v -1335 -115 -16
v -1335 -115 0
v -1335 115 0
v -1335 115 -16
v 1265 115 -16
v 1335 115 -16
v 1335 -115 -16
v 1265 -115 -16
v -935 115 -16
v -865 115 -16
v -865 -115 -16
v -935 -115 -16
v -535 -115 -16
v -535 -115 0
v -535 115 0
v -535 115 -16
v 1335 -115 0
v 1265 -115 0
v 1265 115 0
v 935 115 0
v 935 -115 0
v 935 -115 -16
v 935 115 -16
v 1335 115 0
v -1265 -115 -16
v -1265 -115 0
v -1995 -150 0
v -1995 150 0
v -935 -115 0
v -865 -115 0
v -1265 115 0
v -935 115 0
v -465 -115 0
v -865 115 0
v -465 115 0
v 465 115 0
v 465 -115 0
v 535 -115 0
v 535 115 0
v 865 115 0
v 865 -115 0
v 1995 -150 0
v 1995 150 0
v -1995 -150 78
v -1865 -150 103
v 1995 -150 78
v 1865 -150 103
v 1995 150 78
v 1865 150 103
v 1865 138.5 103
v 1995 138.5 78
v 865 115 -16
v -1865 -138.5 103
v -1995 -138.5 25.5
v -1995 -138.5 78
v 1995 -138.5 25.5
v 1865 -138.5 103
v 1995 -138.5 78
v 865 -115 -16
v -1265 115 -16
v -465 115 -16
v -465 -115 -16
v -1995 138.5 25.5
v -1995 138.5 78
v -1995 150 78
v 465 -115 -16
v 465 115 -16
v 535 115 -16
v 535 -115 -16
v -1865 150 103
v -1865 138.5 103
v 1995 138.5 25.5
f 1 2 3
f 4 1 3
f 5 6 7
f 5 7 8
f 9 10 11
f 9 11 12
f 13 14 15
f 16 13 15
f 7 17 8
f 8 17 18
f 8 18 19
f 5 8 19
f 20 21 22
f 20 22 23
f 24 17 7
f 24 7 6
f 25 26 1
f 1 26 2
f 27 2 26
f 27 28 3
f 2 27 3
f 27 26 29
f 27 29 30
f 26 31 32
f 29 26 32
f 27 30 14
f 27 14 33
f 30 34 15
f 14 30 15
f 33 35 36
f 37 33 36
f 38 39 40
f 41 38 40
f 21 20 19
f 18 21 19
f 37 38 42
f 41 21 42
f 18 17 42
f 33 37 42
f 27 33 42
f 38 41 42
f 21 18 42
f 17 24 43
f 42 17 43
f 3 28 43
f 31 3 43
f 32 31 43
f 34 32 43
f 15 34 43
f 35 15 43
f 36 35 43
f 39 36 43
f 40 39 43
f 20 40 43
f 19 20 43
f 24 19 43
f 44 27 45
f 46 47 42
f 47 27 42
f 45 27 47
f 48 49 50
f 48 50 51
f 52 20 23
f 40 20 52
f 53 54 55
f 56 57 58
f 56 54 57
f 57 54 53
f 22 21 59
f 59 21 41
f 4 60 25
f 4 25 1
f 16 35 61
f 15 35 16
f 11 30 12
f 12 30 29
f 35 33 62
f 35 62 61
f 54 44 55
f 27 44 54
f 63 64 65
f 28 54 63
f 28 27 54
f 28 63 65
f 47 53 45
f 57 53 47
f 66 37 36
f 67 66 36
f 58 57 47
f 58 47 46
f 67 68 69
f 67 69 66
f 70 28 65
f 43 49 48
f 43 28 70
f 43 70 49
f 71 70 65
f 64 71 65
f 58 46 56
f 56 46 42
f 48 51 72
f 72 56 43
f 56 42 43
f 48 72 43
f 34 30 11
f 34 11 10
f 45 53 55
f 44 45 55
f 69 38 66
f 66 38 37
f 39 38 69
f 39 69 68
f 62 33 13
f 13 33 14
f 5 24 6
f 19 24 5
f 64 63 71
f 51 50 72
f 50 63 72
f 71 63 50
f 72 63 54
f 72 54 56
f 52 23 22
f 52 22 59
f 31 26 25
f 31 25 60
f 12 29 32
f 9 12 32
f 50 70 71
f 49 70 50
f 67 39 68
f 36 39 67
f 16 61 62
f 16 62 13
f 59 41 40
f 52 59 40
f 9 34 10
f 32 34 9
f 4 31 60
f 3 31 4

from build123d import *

# Parameters (mm, degrees)
SKETCH_1_W          = 3990
SKETCH_1_H          = 300
SKETCH_1_R          = 13
SKETCH_1_R_2        = 11.5
EXTRUDE_1608_DEPTH  = 25.5
SKETCH_2_W          = 3990
SKETCH_2_H          = 11.5
EXTRUDE_1_DEPTH     = 77.5
SKETCH_3_W          = 70
SKETCH_3_H          = 230
EXTRUDE_2_DEPTH     = 16
SKETCH_4_R          = 13
CUT_EXTRUDE_1_DEPTH = 2003.131676489
CUT_EXTRUDE_2_DEPTH = 2021.057919962
SKETCH_6_W          = 3990
SKETCH_6_H          = 277
EXTRUDE_3_DEPTH     = 25.5
SKETCH_7_W          = 70
SKETCH_7_H          = 230
EXTRUDE_4_DEPTH     = 16


with BuildPart() as part:
    # 草图1 → Extrude 1608 (new body)
    with BuildSketch(Plane.XY):
        Rectangle(SKETCH_1_W, SKETCH_1_H)
        with Locations((1940, 80)):
            Circle(SKETCH_1_R, mode=Mode.SUBTRACT)
        with Locations((1860, 80)):
            Circle(SKETCH_1_R, mode=Mode.SUBTRACT)
        with Locations((1780, 80)):
            Circle(SKETCH_1_R, mode=Mode.SUBTRACT)
        with Locations((1700, 80)):
            Circle(SKETCH_1_R, mode=Mode.SUBTRACT)
        with Locations((1540, 80)):
            Circle(SKETCH_1_R_2, mode=Mode.SUBTRACT)
        with Locations((1380, 80)):
            Circle(SKETCH_1_R_2, mode=Mode.SUBTRACT)
        with Locations((1220, 80)):
            Circle(SKETCH_1_R_2, mode=Mode.SUBTRACT)
        with Locations((1060, 80)):
            Circle(SKETCH_1_R_2, mode=Mode.SUBTRACT)
        with Locations((980, 80)):
            Circle(SKETCH_1_R_2, mode=Mode.SUBTRACT)
        with Locations((820, 80)):
            Circle(SKETCH_1_R_2, mode=Mode.SUBTRACT)
        with Locations((740, 80)):
            Circle(SKETCH_1_R_2, mode=Mode.SUBTRACT)
        with Locations((580, 80)):
            Circle(SKETCH_1_R_2, mode=Mode.SUBTRACT)
        with Locations((980, 0)):
            Circle(SKETCH_1_R_2, mode=Mode.SUBTRACT)
        with Locations((1060, 0)):
            Circle(SKETCH_1_R_2, mode=Mode.SUBTRACT)
        with Locations((820, 0)):
            Circle(SKETCH_1_R_2, mode=Mode.SUBTRACT)
        with Locations((740, 0)):
            Circle(SKETCH_1_R_2, mode=Mode.SUBTRACT)
        with Locations((580, 0)):
            Circle(SKETCH_1_R_2, mode=Mode.SUBTRACT)
        with Locations((1220, 0)):
            Circle(SKETCH_1_R_2, mode=Mode.SUBTRACT)
        with Locations((1380, 0)):
            Circle(SKETCH_1_R_2, mode=Mode.SUBTRACT)
        with Locations((1540, 0)):
            Circle(SKETCH_1_R_2, mode=Mode.SUBTRACT)
        with Locations((1700, 0)):
            Circle(SKETCH_1_R, mode=Mode.SUBTRACT)
        with Locations((1780, 0)):
            Circle(SKETCH_1_R, mode=Mode.SUBTRACT)
        with Locations((1860, 0)):
            Circle(SKETCH_1_R, mode=Mode.SUBTRACT)
        with Locations((1940, 0)):
            Circle(SKETCH_1_R, mode=Mode.SUBTRACT)
        with Locations((420, 80)):
            Circle(SKETCH_1_R_2, mode=Mode.SUBTRACT)
        with Locations((420, 0)):
            Circle(SKETCH_1_R_2, mode=Mode.SUBTRACT)
        with Locations((300, 0)):
            Circle(SKETCH_1_R_2, mode=Mode.SUBTRACT)
        with Locations((300, 80)):
            Circle(SKETCH_1_R_2, mode=Mode.SUBTRACT)
        with Locations((220, 80)):
            Circle(SKETCH_1_R_2, mode=Mode.SUBTRACT)
        with Locations((220, 0)):
            Circle(SKETCH_1_R_2, mode=Mode.SUBTRACT)
        with Locations((140, 0)):
            Circle(SKETCH_1_R, mode=Mode.SUBTRACT)
        with Locations((140, 80)):
            Circle(SKETCH_1_R, mode=Mode.SUBTRACT)
        with Locations((60, 80)):
            Circle(SKETCH_1_R, mode=Mode.SUBTRACT)
        with Locations((60, 0)):
            Circle(SKETCH_1_R, mode=Mode.SUBTRACT)
        with Locations(Location((1700, -80, 0), (0, 0, 180))):
            Circle(SKETCH_1_R, mode=Mode.SUBTRACT)
        with Locations(Location((1780, -80, 0), (0, 0, 180))):
            Circle(SKETCH_1_R, mode=Mode.SUBTRACT)
        with Locations(Location((1860, -80, 0), (0, 0, 180))):
            Circle(SKETCH_1_R, mode=Mode.SUBTRACT)
        with Locations(Location((1940, -80, 0), (0, 0, 180))):
            Circle(SKETCH_1_R, mode=Mode.SUBTRACT)
        with Locations(Location((580, -80, 0), (0, 0, 180))):
            Circle(SKETCH_1_R_2, mode=Mode.SUBTRACT)
        with Locations(Location((740, -80, 0), (0, 0, 180))):
            Circle(SKETCH_1_R_2, mode=Mode.SUBTRACT)
        with Locations(Location((820, -80, 0), (0, 0, 180))):
            Circle(SKETCH_1_R_2, mode=Mode.SUBTRACT)
        with Locations(Location((980, -80, 0), (0, 0, 180))):
            Circle(SKETCH_1_R_2, mode=Mode.SUBTRACT)
        with Locations(Location((1060, -80, 0), (0, 0, 180))):
            Circle(SKETCH_1_R_2, mode=Mode.SUBTRACT)
        with Locations(Location((1220, -80, 0), (0, 0, 180))):
            Circle(SKETCH_1_R_2, mode=Mode.SUBTRACT)
        with Locations(Location((1380, -80, 0), (0, 0, 180))):
            Circle(SKETCH_1_R_2, mode=Mode.SUBTRACT)
        with Locations(Location((1540, -80, 0), (0, 0, 180))):
            Circle(SKETCH_1_R_2, mode=Mode.SUBTRACT)
        with Locations(Location((220, -80, 0), (0, 0, 180))):
            Circle(SKETCH_1_R_2, mode=Mode.SUBTRACT)
        with Locations(Location((300, -80, 0), (0, 0, 180))):
            Circle(SKETCH_1_R_2, mode=Mode.SUBTRACT)
        with Locations(Location((420, -80, 0), (0, 0, 180))):
            Circle(SKETCH_1_R_2, mode=Mode.SUBTRACT)
        with Locations(Location((60, -80, 0), (0, 0, 180))):
            Circle(SKETCH_1_R, mode=Mode.SUBTRACT)
        with Locations(Location((140, -80, 0), (0, 0, 180))):
            Circle(SKETCH_1_R, mode=Mode.SUBTRACT)
        with Locations((-140, -80)):
            Circle(SKETCH_1_R, mode=Mode.SUBTRACT)
        with Locations((-60, -80)):
            Circle(SKETCH_1_R, mode=Mode.SUBTRACT)
        with Locations((-580, -80)):
            Circle(SKETCH_1_R_2, mode=Mode.SUBTRACT)
        with Locations((-420, -80)):
            Circle(SKETCH_1_R_2, mode=Mode.SUBTRACT)
        with Locations((-300, -80)):
            Circle(SKETCH_1_R_2, mode=Mode.SUBTRACT)
        with Locations((-220, -80)):
            Circle(SKETCH_1_R_2, mode=Mode.SUBTRACT)
        with Locations((-1540, -80)):
            Circle(SKETCH_1_R_2, mode=Mode.SUBTRACT)
        with Locations((-1380, -80)):
            Circle(SKETCH_1_R_2, mode=Mode.SUBTRACT)
        with Locations((-1220, -80)):
            Circle(SKETCH_1_R_2, mode=Mode.SUBTRACT)
        with Locations((-1060, -80)):
            Circle(SKETCH_1_R_2, mode=Mode.SUBTRACT)
        with Locations((-980, -80)):
            Circle(SKETCH_1_R_2, mode=Mode.SUBTRACT)
        with Locations((-820, -80)):
            Circle(SKETCH_1_R_2, mode=Mode.SUBTRACT)
        with Locations((-740, -80)):
            Circle(SKETCH_1_R_2, mode=Mode.SUBTRACT)
        with Locations((-1940, -80)):
            Circle(SKETCH_1_R, mode=Mode.SUBTRACT)
        with Locations((-1860, -80)):
            Circle(SKETCH_1_R, mode=Mode.SUBTRACT)
        with Locations((-1780, -80)):
            Circle(SKETCH_1_R, mode=Mode.SUBTRACT)
        with Locations((-1700, -80)):
            Circle(SKETCH_1_R, mode=Mode.SUBTRACT)
        with Locations(Location((-60, 0, 0), (0, 0, 180))):
            Circle(SKETCH_1_R, mode=Mode.SUBTRACT)
        with Locations(Location((-60, 80, 0), (0, 0, 180))):
            Circle(SKETCH_1_R, mode=Mode.SUBTRACT)
        with Locations(Location((-140, 80, 0), (0, 0, 180))):
            Circle(SKETCH_1_R, mode=Mode.SUBTRACT)
        with Locations(Location((-140, 0, 0), (0, 0, 180))):
            Circle(SKETCH_1_R, mode=Mode.SUBTRACT)
        with Locations(Location((-220, 0, 0), (0, 0, 180))):
            Circle(SKETCH_1_R_2, mode=Mode.SUBTRACT)
        with Locations(Location((-220, 80, 0), (0, 0, 180))):
            Circle(SKETCH_1_R_2, mode=Mode.SUBTRACT)
        with Locations(Location((-300, 80, 0), (0, 0, 180))):
            Circle(SKETCH_1_R_2, mode=Mode.SUBTRACT)
        with Locations(Location((-300, 0, 0), (0, 0, 180))):
            Circle(SKETCH_1_R_2, mode=Mode.SUBTRACT)
        with Locations(Location((-420, 0, 0), (0, 0, 180))):
            Circle(SKETCH_1_R_2, mode=Mode.SUBTRACT)
        with Locations(Location((-420, 80, 0), (0, 0, 180))):
            Circle(SKETCH_1_R_2, mode=Mode.SUBTRACT)
        with Locations(Location((-1940, 0, 0), (0, 0, 180))):
            Circle(SKETCH_1_R, mode=Mode.SUBTRACT)
        with Locations(Location((-1860, 0, 0), (0, 0, 180))):
            Circle(SKETCH_1_R, mode=Mode.SUBTRACT)
        with Locations(Location((-1780, 0, 0), (0, 0, 180))):
            Circle(SKETCH_1_R, mode=Mode.SUBTRACT)
        with Locations(Location((-1700, 0, 0), (0, 0, 180))):
            Circle(SKETCH_1_R, mode=Mode.SUBTRACT)
        with Locations(Location((-1540, 0, 0), (0, 0, 180))):
            Circle(SKETCH_1_R_2, mode=Mode.SUBTRACT)
        with Locations(Location((-1380, 0, 0), (0, 0, 180))):
            Circle(SKETCH_1_R_2, mode=Mode.SUBTRACT)
        with Locations(Location((-1220, 0, 0), (0, 0, 180))):
            Circle(SKETCH_1_R_2, mode=Mode.SUBTRACT)
        with Locations(Location((-580, 0, 0), (0, 0, 180))):
            Circle(SKETCH_1_R_2, mode=Mode.SUBTRACT)
        with Locations(Location((-740, 0, 0), (0, 0, 180))):
            Circle(SKETCH_1_R_2, mode=Mode.SUBTRACT)
        with Locations(Location((-820, 0, 0), (0, 0, 180))):
            Circle(SKETCH_1_R_2, mode=Mode.SUBTRACT)
        with Locations(Location((-1060, 0, 0), (0, 0, 180))):
            Circle(SKETCH_1_R_2, mode=Mode.SUBTRACT)
        with Locations(Location((-980, 0, 0), (0, 0, 180))):
            Circle(SKETCH_1_R_2, mode=Mode.SUBTRACT)
        with Locations(Location((-580, 80, 0), (0, 0, 180))):
            Circle(SKETCH_1_R_2, mode=Mode.SUBTRACT)
        with Locations(Location((-740, 80, 0), (0, 0, 180))):
            Circle(SKETCH_1_R_2, mode=Mode.SUBTRACT)
        with Locations(Location((-820, 80, 0), (0, 0, 180))):
            Circle(SKETCH_1_R_2, mode=Mode.SUBTRACT)
        with Locations(Location((-980, 80, 0), (0, 0, 180))):
            Circle(SKETCH_1_R_2, mode=Mode.SUBTRACT)
        with Locations(Location((-1060, 80, 0), (0, 0, 180))):
            Circle(SKETCH_1_R_2, mode=Mode.SUBTRACT)
        with Locations(Location((-1220, 80, 0), (0, 0, 180))):
            Circle(SKETCH_1_R_2, mode=Mode.SUBTRACT)
        with Locations(Location((-1380, 80, 0), (0, 0, 180))):
            Circle(SKETCH_1_R_2, mode=Mode.SUBTRACT)
        with Locations(Location((-1540, 80, 0), (0, 0, 180))):
            Circle(SKETCH_1_R_2, mode=Mode.SUBTRACT)
        with Locations(Location((-1700, 80, 0), (0, 0, 180))):
            Circle(SKETCH_1_R, mode=Mode.SUBTRACT)
        with Locations(Location((-1780, 80, 0), (0, 0, 180))):
            Circle(SKETCH_1_R, mode=Mode.SUBTRACT)
        with Locations(Location((-1860, 80, 0), (0, 0, 180))):
            Circle(SKETCH_1_R, mode=Mode.SUBTRACT)
        with Locations(Location((-1940, 80, 0), (0, 0, 180))):
            Circle(SKETCH_1_R, mode=Mode.SUBTRACT)
    extrude(amount=EXTRUDE_1608_DEPTH)

    # 草图2 → 凸台-拉伸1 (add)
    with BuildSketch(Plane.XY.offset(25.5)):
        with Locations((0, 144.25)):
            Rectangle(SKETCH_2_W, SKETCH_2_H)
        with Locations((0, -144.25)):
            Rectangle(SKETCH_2_W, SKETCH_2_H)
    extrude(amount=EXTRUDE_1_DEPTH)

    # 草图3 → 凸台-拉伸2 (add)
    with BuildSketch(Plane(origin=(0, 0, 0), x_dir=(-1, 0, 0), z_dir=(0, 0, -1))):
        with Locations((1300, 0)):
            Rectangle(SKETCH_3_W, SKETCH_3_H)
        with Locations((900, 0)):
            Rectangle(SKETCH_3_W, SKETCH_3_H)
        with Locations((-1300, 0)):
            Rectangle(SKETCH_3_W, SKETCH_3_H)
        with Locations((500, 0)):
            Rectangle(SKETCH_3_W, SKETCH_3_H)
        with Locations((-900, 0)):
            Rectangle(SKETCH_3_W, SKETCH_3_H)
        with Locations((-500, 0)):
            Rectangle(SKETCH_3_W, SKETCH_3_H)
    extrude(amount=EXTRUDE_2_DEPTH)

    # 草图4 → 切除-拉伸1 (cut, through all)
    with BuildSketch(Plane.XY.offset(25.5)):
        with Locations((1300, 80)):
            Circle(SKETCH_4_R)
        with Locations((900, 80)):
            Circle(SKETCH_4_R)
        with Locations((900, 0)):
            Circle(SKETCH_4_R)
        with Locations((1300, 0)):
            Circle(SKETCH_4_R)
        with Locations((900, -80)):
            Circle(SKETCH_4_R)
        with Locations((1300, -80)):
            Circle(SKETCH_4_R)
        with Locations((500, 80)):
            Circle(SKETCH_4_R)
        with Locations((500, 0)):
            Circle(SKETCH_4_R)
        with Locations((500, -80)):
            Circle(SKETCH_4_R)
        with Locations((-500, -80)):
            Circle(SKETCH_4_R)
        with Locations((-500, 0)):
            Circle(SKETCH_4_R)
        with Locations((-500, 80)):
            Circle(SKETCH_4_R)
        with Locations((-1300, -80)):
            Circle(SKETCH_4_R)
        with Locations((-900, -80)):
            Circle(SKETCH_4_R)
        with Locations((-1300, 0)):
            Circle(SKETCH_4_R)
        with Locations((-900, 0)):
            Circle(SKETCH_4_R)
        with Locations((-900, 80)):
            Circle(SKETCH_4_R)
        with Locations((-1300, 80)):
            Circle(SKETCH_4_R)
    extrude(amount=-CUT_EXTRUDE_1_DEPTH, mode=Mode.SUBTRACT)

    # 草图5 → 切除-拉伸2 (cut, through all)
    with BuildSketch(Plane(origin=(0, 150, 0), x_dir=(-1, 0, 0), z_dir=(0, 1, 0))):
        Polygon((-1995, 78), (-1995, 103), (-1865, 103), align=None)
        Polygon((1865, 103), (1995, 78), (1995, 103), align=None)
    extrude(amount=-CUT_EXTRUDE_2_DEPTH, mode=Mode.SUBTRACT)

    # 草图6 → 凸台-拉伸3 (add)
    with BuildSketch(Plane.XY.offset(25.5)):
        Rectangle(SKETCH_6_W, SKETCH_6_H)
    extrude(amount=-EXTRUDE_3_DEPTH)

    # 草图7 → 凸台-拉伸4 (add)
    with BuildSketch(Plane(origin=(0, 0, 0), x_dir=(-1, 0, 0), z_dir=(0, 0, -1))):
        with Locations((-1300, 0)):
            Rectangle(SKETCH_7_W, SKETCH_7_H)
        with Locations((-900, 0)):
            Rectangle(SKETCH_7_W, SKETCH_7_H)
        with Locations((-500, 0)):
            Rectangle(SKETCH_7_W, SKETCH_7_H)
        with Locations((500, 0)):
            Rectangle(SKETCH_7_W, SKETCH_7_H)
        with Locations((900, 0)):
            Rectangle(SKETCH_7_W, SKETCH_7_H)
        with Locations((1300, 0)):
            Rectangle(SKETCH_7_W, SKETCH_7_H)
    extrude(amount=EXTRUDE_4_DEPTH)


solid = part.part
